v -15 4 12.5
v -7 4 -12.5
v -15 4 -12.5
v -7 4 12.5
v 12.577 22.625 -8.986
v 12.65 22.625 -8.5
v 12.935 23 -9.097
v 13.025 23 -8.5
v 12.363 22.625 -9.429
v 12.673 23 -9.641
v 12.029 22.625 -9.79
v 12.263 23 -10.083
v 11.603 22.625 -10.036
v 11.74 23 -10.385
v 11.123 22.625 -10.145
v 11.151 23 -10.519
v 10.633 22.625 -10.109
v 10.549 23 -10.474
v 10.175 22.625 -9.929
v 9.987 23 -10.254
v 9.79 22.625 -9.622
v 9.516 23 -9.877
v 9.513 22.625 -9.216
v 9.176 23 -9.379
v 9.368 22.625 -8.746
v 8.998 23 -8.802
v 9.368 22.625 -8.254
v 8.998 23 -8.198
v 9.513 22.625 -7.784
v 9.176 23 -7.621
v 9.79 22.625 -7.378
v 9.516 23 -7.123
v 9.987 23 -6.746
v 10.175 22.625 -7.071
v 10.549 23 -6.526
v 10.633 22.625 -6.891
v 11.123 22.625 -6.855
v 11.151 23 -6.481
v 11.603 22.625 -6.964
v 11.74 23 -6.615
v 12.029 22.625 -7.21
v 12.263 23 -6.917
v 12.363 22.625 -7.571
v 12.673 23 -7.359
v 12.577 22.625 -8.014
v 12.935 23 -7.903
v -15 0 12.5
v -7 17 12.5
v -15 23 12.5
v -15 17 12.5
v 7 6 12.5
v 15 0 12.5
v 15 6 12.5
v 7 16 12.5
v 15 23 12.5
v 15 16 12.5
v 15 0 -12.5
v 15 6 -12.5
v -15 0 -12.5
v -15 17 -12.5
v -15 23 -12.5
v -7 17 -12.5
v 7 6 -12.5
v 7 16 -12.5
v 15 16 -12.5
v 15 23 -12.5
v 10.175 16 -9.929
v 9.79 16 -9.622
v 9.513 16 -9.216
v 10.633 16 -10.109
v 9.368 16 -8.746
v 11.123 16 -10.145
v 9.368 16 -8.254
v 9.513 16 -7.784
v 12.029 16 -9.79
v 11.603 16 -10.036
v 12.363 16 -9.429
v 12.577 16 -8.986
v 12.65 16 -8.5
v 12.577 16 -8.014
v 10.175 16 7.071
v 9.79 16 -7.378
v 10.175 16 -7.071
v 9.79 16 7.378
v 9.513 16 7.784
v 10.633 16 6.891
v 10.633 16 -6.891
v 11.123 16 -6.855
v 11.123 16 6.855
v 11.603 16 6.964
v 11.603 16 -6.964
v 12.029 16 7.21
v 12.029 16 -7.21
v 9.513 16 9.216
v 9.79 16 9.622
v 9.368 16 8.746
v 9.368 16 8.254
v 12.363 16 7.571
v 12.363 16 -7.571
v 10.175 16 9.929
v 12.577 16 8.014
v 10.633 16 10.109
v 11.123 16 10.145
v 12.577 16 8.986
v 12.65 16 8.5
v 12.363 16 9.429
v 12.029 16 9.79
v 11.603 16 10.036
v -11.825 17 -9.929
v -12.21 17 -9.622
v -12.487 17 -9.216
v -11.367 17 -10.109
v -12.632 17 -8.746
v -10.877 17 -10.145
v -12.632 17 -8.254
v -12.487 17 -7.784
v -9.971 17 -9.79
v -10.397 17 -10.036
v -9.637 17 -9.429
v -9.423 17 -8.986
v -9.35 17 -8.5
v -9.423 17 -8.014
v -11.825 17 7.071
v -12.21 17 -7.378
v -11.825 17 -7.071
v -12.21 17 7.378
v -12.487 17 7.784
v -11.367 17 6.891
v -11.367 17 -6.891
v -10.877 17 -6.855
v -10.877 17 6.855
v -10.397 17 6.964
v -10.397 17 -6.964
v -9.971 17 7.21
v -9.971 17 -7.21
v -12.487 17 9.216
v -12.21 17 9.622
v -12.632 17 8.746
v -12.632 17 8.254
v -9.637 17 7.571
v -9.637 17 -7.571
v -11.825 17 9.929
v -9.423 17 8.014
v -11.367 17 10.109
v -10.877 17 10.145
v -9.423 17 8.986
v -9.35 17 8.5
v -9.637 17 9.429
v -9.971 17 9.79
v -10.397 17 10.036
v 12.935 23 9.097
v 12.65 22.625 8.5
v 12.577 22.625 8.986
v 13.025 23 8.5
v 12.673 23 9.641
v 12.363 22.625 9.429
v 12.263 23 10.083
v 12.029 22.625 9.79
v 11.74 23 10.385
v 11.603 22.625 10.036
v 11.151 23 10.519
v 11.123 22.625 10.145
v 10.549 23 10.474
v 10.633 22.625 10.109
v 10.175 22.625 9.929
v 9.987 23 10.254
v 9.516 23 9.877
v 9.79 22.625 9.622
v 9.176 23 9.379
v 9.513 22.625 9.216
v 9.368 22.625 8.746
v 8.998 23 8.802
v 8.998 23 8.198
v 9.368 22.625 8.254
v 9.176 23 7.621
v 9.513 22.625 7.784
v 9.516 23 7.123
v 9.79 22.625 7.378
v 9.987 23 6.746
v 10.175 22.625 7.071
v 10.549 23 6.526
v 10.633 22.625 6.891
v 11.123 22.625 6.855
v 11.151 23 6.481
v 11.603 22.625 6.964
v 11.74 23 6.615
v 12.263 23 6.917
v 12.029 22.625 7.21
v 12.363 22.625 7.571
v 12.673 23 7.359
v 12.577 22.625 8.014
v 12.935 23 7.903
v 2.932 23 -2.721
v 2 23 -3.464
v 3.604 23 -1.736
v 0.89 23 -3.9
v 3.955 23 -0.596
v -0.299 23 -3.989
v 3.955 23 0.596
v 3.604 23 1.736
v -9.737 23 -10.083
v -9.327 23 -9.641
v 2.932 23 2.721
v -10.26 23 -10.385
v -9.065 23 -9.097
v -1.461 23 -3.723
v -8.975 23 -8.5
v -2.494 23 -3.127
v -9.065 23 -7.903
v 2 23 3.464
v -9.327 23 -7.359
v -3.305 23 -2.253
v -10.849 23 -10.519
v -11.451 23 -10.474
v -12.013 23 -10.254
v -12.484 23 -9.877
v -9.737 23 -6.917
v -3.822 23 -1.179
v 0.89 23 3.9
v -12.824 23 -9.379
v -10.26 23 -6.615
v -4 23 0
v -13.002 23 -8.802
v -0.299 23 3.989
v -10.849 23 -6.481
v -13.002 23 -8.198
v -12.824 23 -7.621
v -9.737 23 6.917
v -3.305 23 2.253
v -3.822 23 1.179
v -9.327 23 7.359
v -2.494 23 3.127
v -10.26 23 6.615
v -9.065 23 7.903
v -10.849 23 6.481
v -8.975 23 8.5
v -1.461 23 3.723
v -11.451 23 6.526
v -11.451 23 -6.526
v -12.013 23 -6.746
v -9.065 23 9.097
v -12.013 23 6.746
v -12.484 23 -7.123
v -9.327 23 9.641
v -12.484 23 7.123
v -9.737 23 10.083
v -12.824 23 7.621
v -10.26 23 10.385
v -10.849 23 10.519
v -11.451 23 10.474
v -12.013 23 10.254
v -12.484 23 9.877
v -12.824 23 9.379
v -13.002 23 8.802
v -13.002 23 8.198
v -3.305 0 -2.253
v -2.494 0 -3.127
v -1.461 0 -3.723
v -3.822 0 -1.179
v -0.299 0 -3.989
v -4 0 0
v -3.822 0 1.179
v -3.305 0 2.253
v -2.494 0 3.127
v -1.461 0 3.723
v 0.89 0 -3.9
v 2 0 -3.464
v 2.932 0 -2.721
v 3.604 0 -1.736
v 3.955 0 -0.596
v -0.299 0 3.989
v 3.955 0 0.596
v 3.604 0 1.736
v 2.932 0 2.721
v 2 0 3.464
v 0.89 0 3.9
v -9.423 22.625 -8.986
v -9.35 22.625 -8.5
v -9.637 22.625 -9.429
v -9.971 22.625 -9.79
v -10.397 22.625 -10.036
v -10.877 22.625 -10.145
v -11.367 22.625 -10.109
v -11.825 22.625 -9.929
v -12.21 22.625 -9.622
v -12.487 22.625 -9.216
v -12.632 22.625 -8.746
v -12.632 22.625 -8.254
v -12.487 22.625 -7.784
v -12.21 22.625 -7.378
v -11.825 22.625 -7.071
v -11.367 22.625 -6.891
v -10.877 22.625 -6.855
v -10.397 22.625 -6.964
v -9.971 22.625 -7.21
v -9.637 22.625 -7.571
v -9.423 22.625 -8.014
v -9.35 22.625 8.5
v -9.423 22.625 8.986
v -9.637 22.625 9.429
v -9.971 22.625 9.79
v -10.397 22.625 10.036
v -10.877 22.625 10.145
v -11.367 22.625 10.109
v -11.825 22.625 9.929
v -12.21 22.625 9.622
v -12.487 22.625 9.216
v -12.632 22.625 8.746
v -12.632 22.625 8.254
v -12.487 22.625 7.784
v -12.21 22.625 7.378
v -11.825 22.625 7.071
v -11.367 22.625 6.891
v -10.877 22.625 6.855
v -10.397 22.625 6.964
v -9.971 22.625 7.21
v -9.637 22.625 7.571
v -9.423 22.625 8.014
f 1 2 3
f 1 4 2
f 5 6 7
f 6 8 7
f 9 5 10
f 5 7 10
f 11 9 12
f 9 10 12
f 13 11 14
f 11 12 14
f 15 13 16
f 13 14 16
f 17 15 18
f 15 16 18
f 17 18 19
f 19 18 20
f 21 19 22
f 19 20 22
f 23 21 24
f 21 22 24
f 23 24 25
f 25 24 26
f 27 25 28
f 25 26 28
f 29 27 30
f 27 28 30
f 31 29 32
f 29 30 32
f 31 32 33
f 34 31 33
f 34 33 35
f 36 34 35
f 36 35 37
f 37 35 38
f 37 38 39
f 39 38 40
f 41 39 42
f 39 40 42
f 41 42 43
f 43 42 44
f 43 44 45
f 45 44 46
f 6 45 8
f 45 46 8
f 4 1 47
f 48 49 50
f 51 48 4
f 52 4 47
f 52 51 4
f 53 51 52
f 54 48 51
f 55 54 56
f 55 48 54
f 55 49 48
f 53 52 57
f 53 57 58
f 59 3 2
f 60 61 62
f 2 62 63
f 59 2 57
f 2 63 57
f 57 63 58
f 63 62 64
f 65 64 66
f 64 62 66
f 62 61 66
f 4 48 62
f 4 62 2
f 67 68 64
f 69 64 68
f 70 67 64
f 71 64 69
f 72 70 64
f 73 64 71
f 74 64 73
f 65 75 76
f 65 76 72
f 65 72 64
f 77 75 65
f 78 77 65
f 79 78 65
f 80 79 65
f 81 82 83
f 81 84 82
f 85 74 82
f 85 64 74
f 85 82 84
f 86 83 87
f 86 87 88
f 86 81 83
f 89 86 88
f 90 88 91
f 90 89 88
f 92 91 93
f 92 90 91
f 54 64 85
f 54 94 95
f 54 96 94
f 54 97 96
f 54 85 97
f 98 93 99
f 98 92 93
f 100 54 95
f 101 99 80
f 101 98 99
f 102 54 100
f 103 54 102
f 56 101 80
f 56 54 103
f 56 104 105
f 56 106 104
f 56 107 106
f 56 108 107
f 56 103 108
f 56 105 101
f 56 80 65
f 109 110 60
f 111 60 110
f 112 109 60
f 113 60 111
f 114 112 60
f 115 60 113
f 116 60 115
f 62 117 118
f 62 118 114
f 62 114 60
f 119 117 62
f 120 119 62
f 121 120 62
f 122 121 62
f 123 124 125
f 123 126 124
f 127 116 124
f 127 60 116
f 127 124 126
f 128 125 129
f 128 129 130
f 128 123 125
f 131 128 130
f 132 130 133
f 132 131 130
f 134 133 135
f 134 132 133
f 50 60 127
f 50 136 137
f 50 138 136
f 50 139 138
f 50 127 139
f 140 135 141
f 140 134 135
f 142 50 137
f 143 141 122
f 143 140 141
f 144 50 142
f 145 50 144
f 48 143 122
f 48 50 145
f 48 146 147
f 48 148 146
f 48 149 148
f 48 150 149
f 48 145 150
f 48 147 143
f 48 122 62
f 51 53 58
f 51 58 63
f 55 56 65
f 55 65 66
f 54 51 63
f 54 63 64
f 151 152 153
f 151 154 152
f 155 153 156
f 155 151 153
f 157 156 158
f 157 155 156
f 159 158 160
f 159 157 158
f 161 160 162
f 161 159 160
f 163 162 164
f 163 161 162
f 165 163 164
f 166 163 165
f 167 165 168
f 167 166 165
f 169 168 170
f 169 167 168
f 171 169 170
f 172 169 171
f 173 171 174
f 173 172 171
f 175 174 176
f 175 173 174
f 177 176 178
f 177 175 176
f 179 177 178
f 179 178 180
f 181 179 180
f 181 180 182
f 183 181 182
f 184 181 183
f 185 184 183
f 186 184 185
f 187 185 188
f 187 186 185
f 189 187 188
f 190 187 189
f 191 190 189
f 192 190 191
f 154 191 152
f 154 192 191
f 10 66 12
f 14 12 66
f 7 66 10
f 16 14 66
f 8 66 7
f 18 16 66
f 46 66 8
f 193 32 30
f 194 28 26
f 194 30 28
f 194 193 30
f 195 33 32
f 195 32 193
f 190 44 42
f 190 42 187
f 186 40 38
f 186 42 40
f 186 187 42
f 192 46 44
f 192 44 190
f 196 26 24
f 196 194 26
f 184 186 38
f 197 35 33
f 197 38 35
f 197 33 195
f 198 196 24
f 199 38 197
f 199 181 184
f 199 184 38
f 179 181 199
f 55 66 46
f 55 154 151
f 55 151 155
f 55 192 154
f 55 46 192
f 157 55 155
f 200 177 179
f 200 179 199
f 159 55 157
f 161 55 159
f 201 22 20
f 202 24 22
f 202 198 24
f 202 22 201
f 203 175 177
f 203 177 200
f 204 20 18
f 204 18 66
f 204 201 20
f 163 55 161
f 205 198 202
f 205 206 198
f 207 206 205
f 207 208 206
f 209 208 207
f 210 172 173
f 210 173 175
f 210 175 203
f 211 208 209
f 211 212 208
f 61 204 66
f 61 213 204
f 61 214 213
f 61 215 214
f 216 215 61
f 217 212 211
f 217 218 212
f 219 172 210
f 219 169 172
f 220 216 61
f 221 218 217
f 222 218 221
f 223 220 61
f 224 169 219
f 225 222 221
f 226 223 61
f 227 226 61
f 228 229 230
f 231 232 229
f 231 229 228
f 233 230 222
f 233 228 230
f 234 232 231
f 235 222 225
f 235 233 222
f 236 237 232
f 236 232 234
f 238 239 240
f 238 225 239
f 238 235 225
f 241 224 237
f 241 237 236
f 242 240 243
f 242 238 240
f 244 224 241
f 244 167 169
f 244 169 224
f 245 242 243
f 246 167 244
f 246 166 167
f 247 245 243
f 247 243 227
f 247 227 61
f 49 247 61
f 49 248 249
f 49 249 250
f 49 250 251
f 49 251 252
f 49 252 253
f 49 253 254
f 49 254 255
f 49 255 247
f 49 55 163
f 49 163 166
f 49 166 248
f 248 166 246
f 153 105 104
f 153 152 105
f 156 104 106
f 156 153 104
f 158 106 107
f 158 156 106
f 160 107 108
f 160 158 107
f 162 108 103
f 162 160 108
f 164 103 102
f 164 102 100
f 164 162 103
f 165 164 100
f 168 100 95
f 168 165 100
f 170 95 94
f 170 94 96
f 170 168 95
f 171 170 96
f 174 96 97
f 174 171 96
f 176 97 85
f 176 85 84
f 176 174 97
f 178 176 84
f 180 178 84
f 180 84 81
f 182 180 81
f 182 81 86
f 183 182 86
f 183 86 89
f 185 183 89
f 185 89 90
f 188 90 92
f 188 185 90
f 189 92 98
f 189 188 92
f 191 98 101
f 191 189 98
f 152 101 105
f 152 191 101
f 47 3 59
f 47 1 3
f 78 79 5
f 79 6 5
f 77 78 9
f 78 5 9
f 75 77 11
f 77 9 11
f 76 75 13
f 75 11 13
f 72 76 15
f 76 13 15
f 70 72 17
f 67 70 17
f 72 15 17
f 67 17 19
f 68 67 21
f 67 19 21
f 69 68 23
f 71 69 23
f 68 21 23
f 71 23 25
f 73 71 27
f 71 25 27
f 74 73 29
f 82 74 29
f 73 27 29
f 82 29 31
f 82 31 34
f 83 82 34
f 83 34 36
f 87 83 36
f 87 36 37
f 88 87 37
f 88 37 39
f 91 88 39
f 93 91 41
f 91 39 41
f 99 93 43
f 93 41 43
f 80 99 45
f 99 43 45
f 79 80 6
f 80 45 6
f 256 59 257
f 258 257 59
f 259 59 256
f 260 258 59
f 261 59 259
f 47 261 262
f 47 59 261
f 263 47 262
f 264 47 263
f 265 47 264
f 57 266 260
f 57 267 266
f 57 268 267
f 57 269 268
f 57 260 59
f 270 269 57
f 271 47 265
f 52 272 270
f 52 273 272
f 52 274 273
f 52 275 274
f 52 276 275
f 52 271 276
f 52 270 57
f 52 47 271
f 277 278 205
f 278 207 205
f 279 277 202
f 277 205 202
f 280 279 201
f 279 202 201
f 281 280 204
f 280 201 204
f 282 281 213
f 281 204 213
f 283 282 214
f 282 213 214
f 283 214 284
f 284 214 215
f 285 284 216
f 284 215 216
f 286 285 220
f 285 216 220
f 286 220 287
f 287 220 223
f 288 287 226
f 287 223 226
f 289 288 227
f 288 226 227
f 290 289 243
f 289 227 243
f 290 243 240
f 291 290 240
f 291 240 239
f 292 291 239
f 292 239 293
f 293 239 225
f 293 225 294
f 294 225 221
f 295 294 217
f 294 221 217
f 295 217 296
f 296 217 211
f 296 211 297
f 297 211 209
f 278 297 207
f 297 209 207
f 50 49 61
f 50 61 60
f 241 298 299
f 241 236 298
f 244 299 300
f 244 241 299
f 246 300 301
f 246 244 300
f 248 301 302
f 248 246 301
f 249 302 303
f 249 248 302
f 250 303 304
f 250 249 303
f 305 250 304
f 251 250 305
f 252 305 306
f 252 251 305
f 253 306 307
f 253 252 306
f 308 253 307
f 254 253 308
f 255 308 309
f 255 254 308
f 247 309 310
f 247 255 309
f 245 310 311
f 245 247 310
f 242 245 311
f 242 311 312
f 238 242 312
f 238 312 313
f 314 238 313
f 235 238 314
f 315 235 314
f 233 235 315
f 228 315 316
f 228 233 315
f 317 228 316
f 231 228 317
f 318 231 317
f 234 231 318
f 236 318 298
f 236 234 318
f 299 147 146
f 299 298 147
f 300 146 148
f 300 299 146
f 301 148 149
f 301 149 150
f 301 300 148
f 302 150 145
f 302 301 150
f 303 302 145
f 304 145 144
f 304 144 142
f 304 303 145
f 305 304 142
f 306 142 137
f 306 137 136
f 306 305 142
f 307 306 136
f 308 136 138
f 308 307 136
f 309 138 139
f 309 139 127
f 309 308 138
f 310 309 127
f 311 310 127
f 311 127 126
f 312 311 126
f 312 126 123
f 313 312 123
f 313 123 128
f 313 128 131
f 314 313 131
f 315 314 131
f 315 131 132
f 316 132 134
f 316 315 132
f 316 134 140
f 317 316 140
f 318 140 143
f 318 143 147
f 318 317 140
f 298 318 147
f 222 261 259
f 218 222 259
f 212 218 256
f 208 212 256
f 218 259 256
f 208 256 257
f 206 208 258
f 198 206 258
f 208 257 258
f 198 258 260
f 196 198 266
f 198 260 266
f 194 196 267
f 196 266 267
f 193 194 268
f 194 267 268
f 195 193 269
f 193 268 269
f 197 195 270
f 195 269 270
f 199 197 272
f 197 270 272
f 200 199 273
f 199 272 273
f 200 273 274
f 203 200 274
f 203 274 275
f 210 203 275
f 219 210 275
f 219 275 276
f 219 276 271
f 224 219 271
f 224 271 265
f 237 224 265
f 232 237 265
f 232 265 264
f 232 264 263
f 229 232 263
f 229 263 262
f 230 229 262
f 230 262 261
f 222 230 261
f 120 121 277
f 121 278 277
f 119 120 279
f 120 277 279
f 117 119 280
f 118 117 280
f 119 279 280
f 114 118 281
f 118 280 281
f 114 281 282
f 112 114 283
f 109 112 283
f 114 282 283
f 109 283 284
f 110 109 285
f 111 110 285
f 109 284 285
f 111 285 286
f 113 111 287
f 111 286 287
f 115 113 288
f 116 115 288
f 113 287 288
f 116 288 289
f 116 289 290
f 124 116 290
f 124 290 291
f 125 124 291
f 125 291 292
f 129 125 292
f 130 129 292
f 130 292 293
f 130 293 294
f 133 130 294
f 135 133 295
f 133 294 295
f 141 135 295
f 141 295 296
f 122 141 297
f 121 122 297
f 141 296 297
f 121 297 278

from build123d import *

# Parameters (mm, degrees)
RESSALTO_EXTRUS_O1_DEPTH = 12.5
F_8_0MM_DOWEL_HOLE1_D    = 8


# Read off the part's stored shape, not the designer's step: Furo roscado de M4x0.71
with BuildPart() as part:
    # Esboço1 → Ressalto-extrusão1 (new, symmetric)
    with BuildSketch(Plane.XY):
        Polygon((-15, 0), (15, 0), (15, 6), (7, 6), (7, 16), (15, 16), (15, 23), (-15, 23), (-15, 17), (-7, 17), (-7, 4), (-15, 4), align=None)
    extrude(amount=RESSALTO_EXTRUS_O1_DEPTH, both=True)

    # Furo roscado de M4x0.71 outline → Furo roscado de M4x0.71 (revolve, cut)
    with BuildSketch(Plane(origin=(11, 0, -8.5), x_dir=(1, 0, 0), z_dir=(0, 0, 1))):
        Polygon((0, 16), (1.65, 16), (1.65, 22.625), (2.025, 23), (0, 23), align=None)
    furo_roscado_de_m4x0_71 = revolve(axis=Axis((11, 0, -8.5), (0, 1, 0)), mode=Mode.SUBTRACT)

    # Furo roscado de M4x0.71 2 outline → Furo roscado de M4x0.71 2 (revolve, cut)
    with BuildSketch(Plane(origin=(-11, 0, -8.5), x_dir=(1, 0, 0), z_dir=(0, 0, 1))):
        Polygon((0, 17), (1.65, 17), (1.65, 22.625), (2.025, 23), (0, 23), align=None)
    furo_roscado_de_m4x0_71_2 = revolve(axis=Axis((-11, 0, -8.5), (0, 1, 0)), mode=Mode.SUBTRACT)

    # Espelhar1: Furo roscado de M4x0.71, Furo roscado de M4x0.71 2 across plane
    add(furo_roscado_de_m4x0_71.mirror(Plane.XY), mode=Mode.SUBTRACT)
    add(furo_roscado_de_m4x0_71_2.mirror(Plane.XY), mode=Mode.SUBTRACT)

    # Ø8.0mm Dowel Hole1 (through all)
    with Locations(Plane(origin=(0, 23, 0), x_dir=(1, 0, 0), z_dir=(0, 1, 0))):
        with Locations((0, 0)):
            Hole(F_8_0MM_DOWEL_HOLE1_D / 2)


solid = part.part
